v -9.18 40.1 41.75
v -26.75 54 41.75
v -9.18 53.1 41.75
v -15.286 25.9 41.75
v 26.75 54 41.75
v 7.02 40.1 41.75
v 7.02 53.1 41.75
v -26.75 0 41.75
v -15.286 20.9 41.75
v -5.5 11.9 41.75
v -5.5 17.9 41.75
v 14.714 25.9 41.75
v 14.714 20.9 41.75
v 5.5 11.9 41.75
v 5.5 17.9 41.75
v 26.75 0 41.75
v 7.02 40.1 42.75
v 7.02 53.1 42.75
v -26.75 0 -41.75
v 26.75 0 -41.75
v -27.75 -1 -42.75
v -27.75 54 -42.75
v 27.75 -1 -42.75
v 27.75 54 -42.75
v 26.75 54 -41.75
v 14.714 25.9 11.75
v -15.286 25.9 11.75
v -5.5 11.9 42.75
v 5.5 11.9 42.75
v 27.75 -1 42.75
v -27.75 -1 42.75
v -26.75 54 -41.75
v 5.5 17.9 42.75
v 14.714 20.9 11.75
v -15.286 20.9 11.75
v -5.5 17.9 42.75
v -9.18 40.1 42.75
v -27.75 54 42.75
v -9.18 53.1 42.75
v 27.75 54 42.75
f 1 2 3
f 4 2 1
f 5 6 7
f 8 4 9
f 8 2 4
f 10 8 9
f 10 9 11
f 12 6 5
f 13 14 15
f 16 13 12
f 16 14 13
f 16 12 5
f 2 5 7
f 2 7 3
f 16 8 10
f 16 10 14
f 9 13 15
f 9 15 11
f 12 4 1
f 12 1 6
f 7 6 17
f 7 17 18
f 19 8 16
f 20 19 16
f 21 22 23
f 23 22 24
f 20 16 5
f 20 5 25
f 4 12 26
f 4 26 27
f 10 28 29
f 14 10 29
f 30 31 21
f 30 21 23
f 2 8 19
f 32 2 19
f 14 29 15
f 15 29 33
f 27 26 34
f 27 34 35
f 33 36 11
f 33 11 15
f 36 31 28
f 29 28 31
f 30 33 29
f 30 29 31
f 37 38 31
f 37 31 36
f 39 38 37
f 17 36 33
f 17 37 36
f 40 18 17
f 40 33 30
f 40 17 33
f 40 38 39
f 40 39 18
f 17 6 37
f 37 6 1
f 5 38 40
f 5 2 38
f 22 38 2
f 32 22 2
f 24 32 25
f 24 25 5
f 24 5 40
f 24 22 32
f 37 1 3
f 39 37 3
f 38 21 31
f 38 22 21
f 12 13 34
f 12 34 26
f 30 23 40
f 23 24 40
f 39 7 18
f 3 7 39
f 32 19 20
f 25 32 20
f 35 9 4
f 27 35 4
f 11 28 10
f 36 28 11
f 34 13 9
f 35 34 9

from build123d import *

# Parameters (mm, degrees)
SKETCH1_W           = 55.5
SKETCH1_H           = 85.5
SKETCH1_W_2         = 53.5
SKETCH1_H_2         = 83.5
BOSS_EXTRUDE1_DEPTH = 54
SKETCH2_W           = 55.5
SKETCH2_H           = 85.5
BOSS_EXTRUDE2_DEPTH = 1
SKETCH3_W           = 11
SKETCH3_H           = 6
CUT_EXTRUDE1_DEPTH  = 1
SKETCH5_W           = 30
SKETCH5_H           = 5
BOSS_EXTRUDE4_DEPTH = 30
SKETCH8_W           = 16.2
SKETCH8_H           = 13
CUT_EXTRUDE3_DEPTH  = 1


with BuildPart() as part:
    # Sketch1 → Boss-Extrude1 (new body)
    with BuildSketch(Plane(origin=(0, 0, 0), x_dir=(1, 0, 0), z_dir=(0, 1, 0))):
        Rectangle(SKETCH1_W, SKETCH1_H)
        Rectangle(SKETCH1_W_2, SKETCH1_H_2, mode=Mode.SUBTRACT)
    extrude(amount=BOSS_EXTRUDE1_DEPTH)

    # Sketch2 → Boss-Extrude2 (add)
    with BuildSketch(Plane.XZ):
        Rectangle(SKETCH2_W, SKETCH2_H)
    extrude(amount=BOSS_EXTRUDE2_DEPTH)

    # Sketch3 → Cut-Extrude1 (cut)
    with BuildSketch(Plane.XY.offset(42.75)):
        with Locations((0, 14.9)):
            Rectangle(SKETCH3_W, SKETCH3_H)
    extrude(amount=-CUT_EXTRUDE1_DEPTH, mode=Mode.SUBTRACT)

    # Sketch5 → Boss-Extrude4 (add)
    with BuildSketch(Plane(origin=(0, 0, 41.75), x_dir=(-1, 0, 0), z_dir=(0, 0, -1))):
        with Locations((0.286122551, 23.4)):
            Rectangle(SKETCH5_W, SKETCH5_H)
    extrude(amount=BOSS_EXTRUDE4_DEPTH)

    # Sketch8 → Cut-Extrude3 (cut)
    with BuildSketch(Plane(origin=(0, 0, 41.75), x_dir=(-1, 0, 0), z_dir=(0, 0, -1))):
        with Locations((1.080339393, 46.6)):
            Rectangle(SKETCH8_W, SKETCH8_H)
    extrude(amount=-CUT_EXTRUDE3_DEPTH, mode=Mode.SUBTRACT)


solid = part.part
